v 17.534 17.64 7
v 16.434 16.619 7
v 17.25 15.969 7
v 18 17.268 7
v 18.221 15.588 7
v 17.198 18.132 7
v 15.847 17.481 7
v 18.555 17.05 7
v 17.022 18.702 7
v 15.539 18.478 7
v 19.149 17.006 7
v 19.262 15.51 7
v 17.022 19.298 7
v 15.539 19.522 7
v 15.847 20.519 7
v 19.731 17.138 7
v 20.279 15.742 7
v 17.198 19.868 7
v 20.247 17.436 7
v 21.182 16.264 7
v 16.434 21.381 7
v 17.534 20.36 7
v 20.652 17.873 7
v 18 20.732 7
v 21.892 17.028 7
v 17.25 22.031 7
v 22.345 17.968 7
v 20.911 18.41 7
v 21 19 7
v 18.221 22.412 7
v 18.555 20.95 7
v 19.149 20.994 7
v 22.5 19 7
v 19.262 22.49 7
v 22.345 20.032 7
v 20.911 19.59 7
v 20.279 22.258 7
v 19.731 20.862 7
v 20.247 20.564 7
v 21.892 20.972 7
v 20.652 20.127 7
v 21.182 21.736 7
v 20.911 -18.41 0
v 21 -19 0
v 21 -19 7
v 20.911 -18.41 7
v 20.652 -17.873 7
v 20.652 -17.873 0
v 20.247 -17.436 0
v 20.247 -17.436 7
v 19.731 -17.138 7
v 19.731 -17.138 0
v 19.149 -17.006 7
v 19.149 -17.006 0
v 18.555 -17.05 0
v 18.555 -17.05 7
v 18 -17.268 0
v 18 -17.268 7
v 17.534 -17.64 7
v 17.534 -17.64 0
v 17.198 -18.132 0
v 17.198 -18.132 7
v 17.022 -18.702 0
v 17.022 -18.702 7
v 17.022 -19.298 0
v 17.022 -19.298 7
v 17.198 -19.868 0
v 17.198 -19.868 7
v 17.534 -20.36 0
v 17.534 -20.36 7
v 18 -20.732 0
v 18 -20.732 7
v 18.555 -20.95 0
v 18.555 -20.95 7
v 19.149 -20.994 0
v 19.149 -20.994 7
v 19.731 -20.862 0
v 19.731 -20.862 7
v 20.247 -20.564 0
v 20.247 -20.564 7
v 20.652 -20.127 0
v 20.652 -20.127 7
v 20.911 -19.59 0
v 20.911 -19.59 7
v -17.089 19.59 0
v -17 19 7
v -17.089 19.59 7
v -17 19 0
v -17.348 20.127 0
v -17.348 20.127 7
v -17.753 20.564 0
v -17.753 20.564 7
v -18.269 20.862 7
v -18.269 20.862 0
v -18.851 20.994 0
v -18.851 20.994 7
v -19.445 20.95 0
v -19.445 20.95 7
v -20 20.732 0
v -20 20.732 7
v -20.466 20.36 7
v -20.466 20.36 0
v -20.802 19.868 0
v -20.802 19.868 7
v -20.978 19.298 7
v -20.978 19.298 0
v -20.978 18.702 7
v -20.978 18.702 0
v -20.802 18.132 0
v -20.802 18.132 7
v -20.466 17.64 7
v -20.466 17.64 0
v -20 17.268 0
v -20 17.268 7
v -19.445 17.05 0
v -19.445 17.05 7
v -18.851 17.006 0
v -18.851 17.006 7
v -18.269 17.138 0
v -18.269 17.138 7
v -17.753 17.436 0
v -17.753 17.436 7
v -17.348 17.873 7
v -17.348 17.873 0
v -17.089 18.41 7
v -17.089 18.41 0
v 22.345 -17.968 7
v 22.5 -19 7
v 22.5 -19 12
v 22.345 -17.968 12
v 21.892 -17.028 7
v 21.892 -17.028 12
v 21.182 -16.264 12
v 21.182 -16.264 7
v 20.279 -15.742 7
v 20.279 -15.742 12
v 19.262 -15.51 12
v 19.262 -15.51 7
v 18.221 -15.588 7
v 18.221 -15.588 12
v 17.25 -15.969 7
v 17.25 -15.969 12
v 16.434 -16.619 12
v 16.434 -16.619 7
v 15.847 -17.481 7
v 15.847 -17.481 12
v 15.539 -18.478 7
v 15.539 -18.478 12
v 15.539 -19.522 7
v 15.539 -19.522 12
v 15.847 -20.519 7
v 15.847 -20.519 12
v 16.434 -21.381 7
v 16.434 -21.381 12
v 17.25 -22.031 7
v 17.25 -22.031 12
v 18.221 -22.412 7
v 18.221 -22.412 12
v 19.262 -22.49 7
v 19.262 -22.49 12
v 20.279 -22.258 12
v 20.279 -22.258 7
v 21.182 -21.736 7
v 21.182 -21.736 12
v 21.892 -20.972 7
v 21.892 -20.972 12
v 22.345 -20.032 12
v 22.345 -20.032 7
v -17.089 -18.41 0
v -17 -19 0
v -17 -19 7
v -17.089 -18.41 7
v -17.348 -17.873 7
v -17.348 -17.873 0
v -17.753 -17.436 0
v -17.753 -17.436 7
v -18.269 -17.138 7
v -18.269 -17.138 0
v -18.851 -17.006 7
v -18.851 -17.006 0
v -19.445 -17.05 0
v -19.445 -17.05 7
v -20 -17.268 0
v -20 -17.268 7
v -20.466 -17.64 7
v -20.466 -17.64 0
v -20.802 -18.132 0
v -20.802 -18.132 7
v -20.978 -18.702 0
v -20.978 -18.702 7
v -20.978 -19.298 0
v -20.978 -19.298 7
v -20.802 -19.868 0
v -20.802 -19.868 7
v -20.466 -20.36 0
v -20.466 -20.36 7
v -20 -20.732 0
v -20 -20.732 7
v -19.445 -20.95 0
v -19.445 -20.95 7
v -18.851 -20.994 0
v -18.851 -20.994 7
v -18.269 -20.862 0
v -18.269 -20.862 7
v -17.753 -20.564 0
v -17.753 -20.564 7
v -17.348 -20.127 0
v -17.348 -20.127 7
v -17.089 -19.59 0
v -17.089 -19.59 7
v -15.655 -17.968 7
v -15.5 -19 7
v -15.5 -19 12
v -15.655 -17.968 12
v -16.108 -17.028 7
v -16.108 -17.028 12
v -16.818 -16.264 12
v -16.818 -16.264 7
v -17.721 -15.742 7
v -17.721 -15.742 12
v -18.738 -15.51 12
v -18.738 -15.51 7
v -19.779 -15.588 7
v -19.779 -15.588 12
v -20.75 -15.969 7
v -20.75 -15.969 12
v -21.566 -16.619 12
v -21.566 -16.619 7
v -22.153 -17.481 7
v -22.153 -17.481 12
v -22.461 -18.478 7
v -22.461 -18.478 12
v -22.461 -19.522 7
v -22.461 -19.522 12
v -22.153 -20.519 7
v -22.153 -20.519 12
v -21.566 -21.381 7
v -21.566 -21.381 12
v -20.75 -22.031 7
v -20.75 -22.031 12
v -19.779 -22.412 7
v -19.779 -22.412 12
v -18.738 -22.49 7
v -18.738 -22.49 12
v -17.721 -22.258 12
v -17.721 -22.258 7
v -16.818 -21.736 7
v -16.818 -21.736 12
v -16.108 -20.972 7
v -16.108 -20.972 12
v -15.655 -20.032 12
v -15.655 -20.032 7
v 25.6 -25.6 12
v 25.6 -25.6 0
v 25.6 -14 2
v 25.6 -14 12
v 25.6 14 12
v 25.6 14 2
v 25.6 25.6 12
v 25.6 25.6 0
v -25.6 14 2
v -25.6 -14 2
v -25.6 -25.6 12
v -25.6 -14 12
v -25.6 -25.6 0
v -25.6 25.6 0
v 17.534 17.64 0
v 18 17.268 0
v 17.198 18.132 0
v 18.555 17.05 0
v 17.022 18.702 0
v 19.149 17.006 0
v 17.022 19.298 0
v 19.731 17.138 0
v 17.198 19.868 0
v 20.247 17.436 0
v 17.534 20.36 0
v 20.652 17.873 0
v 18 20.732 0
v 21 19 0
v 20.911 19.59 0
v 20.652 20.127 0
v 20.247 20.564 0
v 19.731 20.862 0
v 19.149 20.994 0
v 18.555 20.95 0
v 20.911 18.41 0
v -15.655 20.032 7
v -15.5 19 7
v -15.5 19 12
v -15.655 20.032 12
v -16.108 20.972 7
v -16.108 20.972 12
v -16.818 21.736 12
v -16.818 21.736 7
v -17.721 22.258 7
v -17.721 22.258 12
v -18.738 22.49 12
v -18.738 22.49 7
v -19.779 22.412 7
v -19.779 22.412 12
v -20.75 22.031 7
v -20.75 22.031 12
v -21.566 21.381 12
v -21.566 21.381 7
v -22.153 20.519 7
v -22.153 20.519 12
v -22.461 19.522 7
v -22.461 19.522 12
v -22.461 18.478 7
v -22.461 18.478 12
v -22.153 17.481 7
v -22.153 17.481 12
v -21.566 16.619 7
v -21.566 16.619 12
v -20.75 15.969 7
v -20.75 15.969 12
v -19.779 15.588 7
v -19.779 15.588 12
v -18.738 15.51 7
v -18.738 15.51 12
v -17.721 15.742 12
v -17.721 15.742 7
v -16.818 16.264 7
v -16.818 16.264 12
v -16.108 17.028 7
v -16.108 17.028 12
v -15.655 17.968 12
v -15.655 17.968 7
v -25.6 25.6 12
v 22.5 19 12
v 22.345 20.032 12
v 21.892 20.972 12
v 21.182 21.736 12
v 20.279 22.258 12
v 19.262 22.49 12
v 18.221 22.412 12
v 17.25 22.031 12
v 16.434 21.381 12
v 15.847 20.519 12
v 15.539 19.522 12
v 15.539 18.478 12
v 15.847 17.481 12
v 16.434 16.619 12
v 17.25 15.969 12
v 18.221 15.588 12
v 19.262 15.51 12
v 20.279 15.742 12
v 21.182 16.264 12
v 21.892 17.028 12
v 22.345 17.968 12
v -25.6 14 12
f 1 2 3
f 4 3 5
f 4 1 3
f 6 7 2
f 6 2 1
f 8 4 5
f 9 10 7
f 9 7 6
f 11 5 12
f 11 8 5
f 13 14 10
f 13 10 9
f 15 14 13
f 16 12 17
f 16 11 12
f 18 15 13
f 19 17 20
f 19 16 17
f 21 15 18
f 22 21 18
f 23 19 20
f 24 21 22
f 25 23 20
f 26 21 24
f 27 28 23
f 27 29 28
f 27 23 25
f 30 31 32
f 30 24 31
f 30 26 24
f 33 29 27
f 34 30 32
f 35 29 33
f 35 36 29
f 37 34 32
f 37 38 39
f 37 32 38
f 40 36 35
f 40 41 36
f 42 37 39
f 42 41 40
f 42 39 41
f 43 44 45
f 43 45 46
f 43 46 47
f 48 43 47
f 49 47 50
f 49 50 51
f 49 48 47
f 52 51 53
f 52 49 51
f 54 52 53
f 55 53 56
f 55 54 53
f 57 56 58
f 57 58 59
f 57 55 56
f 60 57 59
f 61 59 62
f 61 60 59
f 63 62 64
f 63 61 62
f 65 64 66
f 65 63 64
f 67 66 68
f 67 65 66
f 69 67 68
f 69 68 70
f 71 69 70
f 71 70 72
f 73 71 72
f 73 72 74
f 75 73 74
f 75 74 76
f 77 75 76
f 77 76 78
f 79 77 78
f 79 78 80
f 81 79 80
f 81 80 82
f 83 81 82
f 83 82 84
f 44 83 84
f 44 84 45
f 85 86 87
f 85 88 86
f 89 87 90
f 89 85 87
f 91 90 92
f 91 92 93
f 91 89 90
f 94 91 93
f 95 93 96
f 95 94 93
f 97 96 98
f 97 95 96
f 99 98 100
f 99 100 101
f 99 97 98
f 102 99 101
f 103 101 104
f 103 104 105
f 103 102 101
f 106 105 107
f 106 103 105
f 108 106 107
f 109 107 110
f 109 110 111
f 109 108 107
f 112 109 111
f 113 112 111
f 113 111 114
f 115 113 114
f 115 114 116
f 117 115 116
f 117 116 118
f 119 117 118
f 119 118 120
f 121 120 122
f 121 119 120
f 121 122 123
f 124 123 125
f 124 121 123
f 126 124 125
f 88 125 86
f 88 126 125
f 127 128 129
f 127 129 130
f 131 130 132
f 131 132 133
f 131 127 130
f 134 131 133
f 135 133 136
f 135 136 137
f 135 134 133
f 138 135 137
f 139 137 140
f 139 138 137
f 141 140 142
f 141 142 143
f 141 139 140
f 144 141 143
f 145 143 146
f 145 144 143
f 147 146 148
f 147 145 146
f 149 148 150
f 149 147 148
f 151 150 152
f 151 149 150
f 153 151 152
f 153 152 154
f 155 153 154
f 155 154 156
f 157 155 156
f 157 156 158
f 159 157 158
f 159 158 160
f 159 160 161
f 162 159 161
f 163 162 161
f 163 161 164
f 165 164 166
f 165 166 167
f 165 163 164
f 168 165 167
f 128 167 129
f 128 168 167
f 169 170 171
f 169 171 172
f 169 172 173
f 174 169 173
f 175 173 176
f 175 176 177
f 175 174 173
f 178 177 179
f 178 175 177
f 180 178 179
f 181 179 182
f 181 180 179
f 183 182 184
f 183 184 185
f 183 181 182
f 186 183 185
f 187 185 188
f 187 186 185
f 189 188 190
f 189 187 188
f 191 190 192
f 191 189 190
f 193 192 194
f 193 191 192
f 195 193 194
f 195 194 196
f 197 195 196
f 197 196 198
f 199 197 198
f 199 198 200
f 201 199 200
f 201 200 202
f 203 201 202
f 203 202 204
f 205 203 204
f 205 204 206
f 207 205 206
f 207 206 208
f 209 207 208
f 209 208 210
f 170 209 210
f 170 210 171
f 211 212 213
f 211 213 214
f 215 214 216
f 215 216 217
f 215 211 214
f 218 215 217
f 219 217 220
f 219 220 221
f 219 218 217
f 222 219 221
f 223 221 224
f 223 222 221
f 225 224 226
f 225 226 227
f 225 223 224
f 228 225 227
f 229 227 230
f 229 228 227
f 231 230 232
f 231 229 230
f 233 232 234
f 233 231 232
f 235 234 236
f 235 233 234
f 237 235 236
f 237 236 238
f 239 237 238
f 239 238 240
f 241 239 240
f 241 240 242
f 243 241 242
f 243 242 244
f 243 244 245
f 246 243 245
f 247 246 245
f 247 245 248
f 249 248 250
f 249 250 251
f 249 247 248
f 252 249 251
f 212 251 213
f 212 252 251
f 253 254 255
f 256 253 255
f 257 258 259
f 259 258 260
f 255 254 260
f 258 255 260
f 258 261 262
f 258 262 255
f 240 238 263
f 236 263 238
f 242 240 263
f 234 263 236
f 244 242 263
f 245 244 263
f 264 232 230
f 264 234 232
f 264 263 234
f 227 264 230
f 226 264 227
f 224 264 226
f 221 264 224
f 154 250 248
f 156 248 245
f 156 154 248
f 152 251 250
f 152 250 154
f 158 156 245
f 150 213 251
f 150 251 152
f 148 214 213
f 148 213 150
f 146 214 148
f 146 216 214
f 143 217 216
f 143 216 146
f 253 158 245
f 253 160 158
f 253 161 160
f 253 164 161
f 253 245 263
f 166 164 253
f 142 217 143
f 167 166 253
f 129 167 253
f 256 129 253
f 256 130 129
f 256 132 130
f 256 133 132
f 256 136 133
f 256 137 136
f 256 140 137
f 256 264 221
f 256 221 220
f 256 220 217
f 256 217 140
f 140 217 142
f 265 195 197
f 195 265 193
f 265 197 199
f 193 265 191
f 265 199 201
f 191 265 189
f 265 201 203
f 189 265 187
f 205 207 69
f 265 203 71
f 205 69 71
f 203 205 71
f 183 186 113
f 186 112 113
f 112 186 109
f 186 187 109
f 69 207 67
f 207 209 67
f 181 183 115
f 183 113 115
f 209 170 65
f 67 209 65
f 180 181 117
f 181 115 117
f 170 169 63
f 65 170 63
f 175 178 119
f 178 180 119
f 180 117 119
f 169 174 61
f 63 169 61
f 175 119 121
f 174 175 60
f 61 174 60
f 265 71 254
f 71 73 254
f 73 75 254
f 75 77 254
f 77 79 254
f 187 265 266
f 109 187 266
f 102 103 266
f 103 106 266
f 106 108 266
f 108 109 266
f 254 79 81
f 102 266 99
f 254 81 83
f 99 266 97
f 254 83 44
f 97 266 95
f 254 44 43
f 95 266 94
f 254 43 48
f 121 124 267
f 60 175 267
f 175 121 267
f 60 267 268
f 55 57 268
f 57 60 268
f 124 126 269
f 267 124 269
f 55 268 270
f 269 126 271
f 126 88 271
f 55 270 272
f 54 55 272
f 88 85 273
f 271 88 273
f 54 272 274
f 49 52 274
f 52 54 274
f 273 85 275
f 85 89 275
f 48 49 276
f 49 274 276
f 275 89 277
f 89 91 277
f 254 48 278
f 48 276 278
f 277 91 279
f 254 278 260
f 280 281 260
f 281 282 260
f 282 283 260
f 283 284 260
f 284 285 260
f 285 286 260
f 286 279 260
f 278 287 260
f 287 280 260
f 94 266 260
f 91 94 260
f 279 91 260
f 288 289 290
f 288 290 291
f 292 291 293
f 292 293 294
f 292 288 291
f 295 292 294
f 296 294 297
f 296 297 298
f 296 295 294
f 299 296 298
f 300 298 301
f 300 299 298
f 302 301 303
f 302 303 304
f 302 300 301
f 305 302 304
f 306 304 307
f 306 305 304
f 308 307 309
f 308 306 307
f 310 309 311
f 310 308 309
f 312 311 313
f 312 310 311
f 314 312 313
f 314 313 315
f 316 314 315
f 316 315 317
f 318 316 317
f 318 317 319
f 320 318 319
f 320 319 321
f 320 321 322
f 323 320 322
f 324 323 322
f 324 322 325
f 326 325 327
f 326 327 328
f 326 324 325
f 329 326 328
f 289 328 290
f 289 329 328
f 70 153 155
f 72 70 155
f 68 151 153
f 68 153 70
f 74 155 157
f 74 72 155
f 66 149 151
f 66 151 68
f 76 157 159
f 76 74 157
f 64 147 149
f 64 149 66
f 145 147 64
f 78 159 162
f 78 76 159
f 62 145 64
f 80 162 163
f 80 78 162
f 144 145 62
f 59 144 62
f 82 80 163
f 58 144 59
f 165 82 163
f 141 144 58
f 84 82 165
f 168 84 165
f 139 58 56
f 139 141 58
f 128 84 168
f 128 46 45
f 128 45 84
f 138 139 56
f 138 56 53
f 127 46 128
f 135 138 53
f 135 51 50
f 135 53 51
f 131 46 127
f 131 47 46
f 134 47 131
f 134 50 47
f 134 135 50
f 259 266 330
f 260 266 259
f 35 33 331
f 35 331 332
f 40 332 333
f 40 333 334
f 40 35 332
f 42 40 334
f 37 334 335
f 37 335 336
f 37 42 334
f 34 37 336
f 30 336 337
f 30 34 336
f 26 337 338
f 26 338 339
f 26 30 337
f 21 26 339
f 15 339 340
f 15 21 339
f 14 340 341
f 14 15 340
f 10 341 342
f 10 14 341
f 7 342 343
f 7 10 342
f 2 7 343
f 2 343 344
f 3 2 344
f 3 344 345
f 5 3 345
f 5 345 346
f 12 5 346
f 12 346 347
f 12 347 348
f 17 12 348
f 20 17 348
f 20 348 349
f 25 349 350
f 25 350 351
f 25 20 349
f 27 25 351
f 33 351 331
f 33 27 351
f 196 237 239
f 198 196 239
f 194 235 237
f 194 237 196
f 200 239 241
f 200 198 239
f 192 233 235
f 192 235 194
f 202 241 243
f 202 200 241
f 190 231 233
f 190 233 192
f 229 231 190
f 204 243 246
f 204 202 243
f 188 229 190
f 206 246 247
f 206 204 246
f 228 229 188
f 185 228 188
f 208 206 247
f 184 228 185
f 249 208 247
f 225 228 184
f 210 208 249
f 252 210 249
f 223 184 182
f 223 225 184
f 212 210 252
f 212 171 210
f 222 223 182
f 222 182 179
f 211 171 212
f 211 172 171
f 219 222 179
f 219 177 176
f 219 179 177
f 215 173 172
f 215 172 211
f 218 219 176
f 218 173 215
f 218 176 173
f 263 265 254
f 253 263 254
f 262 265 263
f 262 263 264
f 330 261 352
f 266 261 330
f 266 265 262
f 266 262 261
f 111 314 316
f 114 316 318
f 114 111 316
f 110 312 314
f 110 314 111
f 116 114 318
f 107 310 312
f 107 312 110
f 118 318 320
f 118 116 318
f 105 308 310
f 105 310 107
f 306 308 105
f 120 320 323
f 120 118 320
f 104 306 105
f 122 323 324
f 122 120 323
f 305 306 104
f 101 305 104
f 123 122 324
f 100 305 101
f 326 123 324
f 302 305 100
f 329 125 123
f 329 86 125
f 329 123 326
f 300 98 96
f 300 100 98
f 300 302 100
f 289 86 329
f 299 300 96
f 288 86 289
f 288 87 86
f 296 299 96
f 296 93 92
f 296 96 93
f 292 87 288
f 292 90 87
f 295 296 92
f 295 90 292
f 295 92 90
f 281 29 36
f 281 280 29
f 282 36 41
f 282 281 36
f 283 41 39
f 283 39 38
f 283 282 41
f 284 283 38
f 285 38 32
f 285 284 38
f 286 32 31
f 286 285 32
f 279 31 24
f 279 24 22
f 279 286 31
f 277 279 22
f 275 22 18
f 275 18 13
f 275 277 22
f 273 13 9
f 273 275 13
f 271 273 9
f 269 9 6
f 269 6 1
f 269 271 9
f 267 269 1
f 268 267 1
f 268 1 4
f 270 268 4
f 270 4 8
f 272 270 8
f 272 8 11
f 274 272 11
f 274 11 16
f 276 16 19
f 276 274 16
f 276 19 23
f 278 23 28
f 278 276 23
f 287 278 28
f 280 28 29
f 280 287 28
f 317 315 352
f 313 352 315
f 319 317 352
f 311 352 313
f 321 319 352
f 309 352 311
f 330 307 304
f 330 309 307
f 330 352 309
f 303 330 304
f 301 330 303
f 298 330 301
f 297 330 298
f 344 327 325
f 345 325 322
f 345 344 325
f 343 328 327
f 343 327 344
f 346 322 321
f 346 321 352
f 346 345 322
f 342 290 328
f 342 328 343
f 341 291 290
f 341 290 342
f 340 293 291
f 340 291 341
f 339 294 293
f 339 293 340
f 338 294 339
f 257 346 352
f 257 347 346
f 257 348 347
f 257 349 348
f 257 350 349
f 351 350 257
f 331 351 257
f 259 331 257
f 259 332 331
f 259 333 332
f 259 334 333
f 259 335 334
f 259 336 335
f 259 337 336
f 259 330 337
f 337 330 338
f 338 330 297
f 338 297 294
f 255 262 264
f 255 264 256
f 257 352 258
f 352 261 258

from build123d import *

# Parameters (mm, degrees)
F0_W     = 51.2
F0_H     = 11.6
F0_R     = 2
F0_H_2   = 28
F1_DEPTH = 2
F2_W     = 51.2
F2_H     = 11.6
F2_R     = 2
F3_DEPTH = 5
F4_W     = 51.2
F4_H     = 11.6
F4_R     = 3.5
F5_DEPTH = 5


with BuildPart() as f1:
    # F0 (on Top) → F1 (new body)
    with BuildSketch(Plane.XY):
        with Locations((0, -19.8)):
            Rectangle(F0_W, F0_H)
        with Locations((-19, -19)):
            Circle(F0_R, mode=Mode.SUBTRACT)
        with Locations((19, -19)):
            Circle(F0_R, mode=Mode.SUBTRACT)
        Rectangle(F0_W, F0_H_2)
        with Locations((0, 19.8)):
            Rectangle(F0_W, F0_H)
        with Locations((-19, 19)):
            Circle(F0_R, mode=Mode.SUBTRACT)
        with Locations((19, 19)):
            Circle(F0_R, mode=Mode.SUBTRACT)
    extrude(amount=F1_DEPTH)

    # F2 (on face) → F3 (join)
    with BuildSketch(Plane.XY.offset(2)):
        with Locations((0, 19.8)):
            Rectangle(F2_W, F2_H)
        with Locations((-19, 19)):
            Circle(F2_R, mode=Mode.SUBTRACT)
        with Locations((19, 19)):
            Circle(F2_R, mode=Mode.SUBTRACT)
        with Locations((0, -19.8)):
            Rectangle(F2_W, F2_H)
        with Locations((-19, -19)):
            Circle(F2_R, mode=Mode.SUBTRACT)
        with Locations((19, -19)):
            Circle(F2_R, mode=Mode.SUBTRACT)
    extrude(amount=F3_DEPTH)

    # F4 (on face) → F5 (join)
    with BuildSketch(Plane.XY.offset(7)):
        with Locations((0, 19.8)):
            Rectangle(F4_W, F4_H)
        with Locations((-19, 19)):
            Circle(F4_R, mode=Mode.SUBTRACT)
        with Locations((19, 19)):
            Circle(F4_R, mode=Mode.SUBTRACT)
        with Locations((0, -19.8)):
            Rectangle(F4_W, F4_H)
        with Locations((-19, -19)):
            Circle(F4_R, mode=Mode.SUBTRACT)
        with Locations((19, -19)):
            Circle(F4_R, mode=Mode.SUBTRACT)
    extrude(amount=F5_DEPTH)


solid = f1.part
